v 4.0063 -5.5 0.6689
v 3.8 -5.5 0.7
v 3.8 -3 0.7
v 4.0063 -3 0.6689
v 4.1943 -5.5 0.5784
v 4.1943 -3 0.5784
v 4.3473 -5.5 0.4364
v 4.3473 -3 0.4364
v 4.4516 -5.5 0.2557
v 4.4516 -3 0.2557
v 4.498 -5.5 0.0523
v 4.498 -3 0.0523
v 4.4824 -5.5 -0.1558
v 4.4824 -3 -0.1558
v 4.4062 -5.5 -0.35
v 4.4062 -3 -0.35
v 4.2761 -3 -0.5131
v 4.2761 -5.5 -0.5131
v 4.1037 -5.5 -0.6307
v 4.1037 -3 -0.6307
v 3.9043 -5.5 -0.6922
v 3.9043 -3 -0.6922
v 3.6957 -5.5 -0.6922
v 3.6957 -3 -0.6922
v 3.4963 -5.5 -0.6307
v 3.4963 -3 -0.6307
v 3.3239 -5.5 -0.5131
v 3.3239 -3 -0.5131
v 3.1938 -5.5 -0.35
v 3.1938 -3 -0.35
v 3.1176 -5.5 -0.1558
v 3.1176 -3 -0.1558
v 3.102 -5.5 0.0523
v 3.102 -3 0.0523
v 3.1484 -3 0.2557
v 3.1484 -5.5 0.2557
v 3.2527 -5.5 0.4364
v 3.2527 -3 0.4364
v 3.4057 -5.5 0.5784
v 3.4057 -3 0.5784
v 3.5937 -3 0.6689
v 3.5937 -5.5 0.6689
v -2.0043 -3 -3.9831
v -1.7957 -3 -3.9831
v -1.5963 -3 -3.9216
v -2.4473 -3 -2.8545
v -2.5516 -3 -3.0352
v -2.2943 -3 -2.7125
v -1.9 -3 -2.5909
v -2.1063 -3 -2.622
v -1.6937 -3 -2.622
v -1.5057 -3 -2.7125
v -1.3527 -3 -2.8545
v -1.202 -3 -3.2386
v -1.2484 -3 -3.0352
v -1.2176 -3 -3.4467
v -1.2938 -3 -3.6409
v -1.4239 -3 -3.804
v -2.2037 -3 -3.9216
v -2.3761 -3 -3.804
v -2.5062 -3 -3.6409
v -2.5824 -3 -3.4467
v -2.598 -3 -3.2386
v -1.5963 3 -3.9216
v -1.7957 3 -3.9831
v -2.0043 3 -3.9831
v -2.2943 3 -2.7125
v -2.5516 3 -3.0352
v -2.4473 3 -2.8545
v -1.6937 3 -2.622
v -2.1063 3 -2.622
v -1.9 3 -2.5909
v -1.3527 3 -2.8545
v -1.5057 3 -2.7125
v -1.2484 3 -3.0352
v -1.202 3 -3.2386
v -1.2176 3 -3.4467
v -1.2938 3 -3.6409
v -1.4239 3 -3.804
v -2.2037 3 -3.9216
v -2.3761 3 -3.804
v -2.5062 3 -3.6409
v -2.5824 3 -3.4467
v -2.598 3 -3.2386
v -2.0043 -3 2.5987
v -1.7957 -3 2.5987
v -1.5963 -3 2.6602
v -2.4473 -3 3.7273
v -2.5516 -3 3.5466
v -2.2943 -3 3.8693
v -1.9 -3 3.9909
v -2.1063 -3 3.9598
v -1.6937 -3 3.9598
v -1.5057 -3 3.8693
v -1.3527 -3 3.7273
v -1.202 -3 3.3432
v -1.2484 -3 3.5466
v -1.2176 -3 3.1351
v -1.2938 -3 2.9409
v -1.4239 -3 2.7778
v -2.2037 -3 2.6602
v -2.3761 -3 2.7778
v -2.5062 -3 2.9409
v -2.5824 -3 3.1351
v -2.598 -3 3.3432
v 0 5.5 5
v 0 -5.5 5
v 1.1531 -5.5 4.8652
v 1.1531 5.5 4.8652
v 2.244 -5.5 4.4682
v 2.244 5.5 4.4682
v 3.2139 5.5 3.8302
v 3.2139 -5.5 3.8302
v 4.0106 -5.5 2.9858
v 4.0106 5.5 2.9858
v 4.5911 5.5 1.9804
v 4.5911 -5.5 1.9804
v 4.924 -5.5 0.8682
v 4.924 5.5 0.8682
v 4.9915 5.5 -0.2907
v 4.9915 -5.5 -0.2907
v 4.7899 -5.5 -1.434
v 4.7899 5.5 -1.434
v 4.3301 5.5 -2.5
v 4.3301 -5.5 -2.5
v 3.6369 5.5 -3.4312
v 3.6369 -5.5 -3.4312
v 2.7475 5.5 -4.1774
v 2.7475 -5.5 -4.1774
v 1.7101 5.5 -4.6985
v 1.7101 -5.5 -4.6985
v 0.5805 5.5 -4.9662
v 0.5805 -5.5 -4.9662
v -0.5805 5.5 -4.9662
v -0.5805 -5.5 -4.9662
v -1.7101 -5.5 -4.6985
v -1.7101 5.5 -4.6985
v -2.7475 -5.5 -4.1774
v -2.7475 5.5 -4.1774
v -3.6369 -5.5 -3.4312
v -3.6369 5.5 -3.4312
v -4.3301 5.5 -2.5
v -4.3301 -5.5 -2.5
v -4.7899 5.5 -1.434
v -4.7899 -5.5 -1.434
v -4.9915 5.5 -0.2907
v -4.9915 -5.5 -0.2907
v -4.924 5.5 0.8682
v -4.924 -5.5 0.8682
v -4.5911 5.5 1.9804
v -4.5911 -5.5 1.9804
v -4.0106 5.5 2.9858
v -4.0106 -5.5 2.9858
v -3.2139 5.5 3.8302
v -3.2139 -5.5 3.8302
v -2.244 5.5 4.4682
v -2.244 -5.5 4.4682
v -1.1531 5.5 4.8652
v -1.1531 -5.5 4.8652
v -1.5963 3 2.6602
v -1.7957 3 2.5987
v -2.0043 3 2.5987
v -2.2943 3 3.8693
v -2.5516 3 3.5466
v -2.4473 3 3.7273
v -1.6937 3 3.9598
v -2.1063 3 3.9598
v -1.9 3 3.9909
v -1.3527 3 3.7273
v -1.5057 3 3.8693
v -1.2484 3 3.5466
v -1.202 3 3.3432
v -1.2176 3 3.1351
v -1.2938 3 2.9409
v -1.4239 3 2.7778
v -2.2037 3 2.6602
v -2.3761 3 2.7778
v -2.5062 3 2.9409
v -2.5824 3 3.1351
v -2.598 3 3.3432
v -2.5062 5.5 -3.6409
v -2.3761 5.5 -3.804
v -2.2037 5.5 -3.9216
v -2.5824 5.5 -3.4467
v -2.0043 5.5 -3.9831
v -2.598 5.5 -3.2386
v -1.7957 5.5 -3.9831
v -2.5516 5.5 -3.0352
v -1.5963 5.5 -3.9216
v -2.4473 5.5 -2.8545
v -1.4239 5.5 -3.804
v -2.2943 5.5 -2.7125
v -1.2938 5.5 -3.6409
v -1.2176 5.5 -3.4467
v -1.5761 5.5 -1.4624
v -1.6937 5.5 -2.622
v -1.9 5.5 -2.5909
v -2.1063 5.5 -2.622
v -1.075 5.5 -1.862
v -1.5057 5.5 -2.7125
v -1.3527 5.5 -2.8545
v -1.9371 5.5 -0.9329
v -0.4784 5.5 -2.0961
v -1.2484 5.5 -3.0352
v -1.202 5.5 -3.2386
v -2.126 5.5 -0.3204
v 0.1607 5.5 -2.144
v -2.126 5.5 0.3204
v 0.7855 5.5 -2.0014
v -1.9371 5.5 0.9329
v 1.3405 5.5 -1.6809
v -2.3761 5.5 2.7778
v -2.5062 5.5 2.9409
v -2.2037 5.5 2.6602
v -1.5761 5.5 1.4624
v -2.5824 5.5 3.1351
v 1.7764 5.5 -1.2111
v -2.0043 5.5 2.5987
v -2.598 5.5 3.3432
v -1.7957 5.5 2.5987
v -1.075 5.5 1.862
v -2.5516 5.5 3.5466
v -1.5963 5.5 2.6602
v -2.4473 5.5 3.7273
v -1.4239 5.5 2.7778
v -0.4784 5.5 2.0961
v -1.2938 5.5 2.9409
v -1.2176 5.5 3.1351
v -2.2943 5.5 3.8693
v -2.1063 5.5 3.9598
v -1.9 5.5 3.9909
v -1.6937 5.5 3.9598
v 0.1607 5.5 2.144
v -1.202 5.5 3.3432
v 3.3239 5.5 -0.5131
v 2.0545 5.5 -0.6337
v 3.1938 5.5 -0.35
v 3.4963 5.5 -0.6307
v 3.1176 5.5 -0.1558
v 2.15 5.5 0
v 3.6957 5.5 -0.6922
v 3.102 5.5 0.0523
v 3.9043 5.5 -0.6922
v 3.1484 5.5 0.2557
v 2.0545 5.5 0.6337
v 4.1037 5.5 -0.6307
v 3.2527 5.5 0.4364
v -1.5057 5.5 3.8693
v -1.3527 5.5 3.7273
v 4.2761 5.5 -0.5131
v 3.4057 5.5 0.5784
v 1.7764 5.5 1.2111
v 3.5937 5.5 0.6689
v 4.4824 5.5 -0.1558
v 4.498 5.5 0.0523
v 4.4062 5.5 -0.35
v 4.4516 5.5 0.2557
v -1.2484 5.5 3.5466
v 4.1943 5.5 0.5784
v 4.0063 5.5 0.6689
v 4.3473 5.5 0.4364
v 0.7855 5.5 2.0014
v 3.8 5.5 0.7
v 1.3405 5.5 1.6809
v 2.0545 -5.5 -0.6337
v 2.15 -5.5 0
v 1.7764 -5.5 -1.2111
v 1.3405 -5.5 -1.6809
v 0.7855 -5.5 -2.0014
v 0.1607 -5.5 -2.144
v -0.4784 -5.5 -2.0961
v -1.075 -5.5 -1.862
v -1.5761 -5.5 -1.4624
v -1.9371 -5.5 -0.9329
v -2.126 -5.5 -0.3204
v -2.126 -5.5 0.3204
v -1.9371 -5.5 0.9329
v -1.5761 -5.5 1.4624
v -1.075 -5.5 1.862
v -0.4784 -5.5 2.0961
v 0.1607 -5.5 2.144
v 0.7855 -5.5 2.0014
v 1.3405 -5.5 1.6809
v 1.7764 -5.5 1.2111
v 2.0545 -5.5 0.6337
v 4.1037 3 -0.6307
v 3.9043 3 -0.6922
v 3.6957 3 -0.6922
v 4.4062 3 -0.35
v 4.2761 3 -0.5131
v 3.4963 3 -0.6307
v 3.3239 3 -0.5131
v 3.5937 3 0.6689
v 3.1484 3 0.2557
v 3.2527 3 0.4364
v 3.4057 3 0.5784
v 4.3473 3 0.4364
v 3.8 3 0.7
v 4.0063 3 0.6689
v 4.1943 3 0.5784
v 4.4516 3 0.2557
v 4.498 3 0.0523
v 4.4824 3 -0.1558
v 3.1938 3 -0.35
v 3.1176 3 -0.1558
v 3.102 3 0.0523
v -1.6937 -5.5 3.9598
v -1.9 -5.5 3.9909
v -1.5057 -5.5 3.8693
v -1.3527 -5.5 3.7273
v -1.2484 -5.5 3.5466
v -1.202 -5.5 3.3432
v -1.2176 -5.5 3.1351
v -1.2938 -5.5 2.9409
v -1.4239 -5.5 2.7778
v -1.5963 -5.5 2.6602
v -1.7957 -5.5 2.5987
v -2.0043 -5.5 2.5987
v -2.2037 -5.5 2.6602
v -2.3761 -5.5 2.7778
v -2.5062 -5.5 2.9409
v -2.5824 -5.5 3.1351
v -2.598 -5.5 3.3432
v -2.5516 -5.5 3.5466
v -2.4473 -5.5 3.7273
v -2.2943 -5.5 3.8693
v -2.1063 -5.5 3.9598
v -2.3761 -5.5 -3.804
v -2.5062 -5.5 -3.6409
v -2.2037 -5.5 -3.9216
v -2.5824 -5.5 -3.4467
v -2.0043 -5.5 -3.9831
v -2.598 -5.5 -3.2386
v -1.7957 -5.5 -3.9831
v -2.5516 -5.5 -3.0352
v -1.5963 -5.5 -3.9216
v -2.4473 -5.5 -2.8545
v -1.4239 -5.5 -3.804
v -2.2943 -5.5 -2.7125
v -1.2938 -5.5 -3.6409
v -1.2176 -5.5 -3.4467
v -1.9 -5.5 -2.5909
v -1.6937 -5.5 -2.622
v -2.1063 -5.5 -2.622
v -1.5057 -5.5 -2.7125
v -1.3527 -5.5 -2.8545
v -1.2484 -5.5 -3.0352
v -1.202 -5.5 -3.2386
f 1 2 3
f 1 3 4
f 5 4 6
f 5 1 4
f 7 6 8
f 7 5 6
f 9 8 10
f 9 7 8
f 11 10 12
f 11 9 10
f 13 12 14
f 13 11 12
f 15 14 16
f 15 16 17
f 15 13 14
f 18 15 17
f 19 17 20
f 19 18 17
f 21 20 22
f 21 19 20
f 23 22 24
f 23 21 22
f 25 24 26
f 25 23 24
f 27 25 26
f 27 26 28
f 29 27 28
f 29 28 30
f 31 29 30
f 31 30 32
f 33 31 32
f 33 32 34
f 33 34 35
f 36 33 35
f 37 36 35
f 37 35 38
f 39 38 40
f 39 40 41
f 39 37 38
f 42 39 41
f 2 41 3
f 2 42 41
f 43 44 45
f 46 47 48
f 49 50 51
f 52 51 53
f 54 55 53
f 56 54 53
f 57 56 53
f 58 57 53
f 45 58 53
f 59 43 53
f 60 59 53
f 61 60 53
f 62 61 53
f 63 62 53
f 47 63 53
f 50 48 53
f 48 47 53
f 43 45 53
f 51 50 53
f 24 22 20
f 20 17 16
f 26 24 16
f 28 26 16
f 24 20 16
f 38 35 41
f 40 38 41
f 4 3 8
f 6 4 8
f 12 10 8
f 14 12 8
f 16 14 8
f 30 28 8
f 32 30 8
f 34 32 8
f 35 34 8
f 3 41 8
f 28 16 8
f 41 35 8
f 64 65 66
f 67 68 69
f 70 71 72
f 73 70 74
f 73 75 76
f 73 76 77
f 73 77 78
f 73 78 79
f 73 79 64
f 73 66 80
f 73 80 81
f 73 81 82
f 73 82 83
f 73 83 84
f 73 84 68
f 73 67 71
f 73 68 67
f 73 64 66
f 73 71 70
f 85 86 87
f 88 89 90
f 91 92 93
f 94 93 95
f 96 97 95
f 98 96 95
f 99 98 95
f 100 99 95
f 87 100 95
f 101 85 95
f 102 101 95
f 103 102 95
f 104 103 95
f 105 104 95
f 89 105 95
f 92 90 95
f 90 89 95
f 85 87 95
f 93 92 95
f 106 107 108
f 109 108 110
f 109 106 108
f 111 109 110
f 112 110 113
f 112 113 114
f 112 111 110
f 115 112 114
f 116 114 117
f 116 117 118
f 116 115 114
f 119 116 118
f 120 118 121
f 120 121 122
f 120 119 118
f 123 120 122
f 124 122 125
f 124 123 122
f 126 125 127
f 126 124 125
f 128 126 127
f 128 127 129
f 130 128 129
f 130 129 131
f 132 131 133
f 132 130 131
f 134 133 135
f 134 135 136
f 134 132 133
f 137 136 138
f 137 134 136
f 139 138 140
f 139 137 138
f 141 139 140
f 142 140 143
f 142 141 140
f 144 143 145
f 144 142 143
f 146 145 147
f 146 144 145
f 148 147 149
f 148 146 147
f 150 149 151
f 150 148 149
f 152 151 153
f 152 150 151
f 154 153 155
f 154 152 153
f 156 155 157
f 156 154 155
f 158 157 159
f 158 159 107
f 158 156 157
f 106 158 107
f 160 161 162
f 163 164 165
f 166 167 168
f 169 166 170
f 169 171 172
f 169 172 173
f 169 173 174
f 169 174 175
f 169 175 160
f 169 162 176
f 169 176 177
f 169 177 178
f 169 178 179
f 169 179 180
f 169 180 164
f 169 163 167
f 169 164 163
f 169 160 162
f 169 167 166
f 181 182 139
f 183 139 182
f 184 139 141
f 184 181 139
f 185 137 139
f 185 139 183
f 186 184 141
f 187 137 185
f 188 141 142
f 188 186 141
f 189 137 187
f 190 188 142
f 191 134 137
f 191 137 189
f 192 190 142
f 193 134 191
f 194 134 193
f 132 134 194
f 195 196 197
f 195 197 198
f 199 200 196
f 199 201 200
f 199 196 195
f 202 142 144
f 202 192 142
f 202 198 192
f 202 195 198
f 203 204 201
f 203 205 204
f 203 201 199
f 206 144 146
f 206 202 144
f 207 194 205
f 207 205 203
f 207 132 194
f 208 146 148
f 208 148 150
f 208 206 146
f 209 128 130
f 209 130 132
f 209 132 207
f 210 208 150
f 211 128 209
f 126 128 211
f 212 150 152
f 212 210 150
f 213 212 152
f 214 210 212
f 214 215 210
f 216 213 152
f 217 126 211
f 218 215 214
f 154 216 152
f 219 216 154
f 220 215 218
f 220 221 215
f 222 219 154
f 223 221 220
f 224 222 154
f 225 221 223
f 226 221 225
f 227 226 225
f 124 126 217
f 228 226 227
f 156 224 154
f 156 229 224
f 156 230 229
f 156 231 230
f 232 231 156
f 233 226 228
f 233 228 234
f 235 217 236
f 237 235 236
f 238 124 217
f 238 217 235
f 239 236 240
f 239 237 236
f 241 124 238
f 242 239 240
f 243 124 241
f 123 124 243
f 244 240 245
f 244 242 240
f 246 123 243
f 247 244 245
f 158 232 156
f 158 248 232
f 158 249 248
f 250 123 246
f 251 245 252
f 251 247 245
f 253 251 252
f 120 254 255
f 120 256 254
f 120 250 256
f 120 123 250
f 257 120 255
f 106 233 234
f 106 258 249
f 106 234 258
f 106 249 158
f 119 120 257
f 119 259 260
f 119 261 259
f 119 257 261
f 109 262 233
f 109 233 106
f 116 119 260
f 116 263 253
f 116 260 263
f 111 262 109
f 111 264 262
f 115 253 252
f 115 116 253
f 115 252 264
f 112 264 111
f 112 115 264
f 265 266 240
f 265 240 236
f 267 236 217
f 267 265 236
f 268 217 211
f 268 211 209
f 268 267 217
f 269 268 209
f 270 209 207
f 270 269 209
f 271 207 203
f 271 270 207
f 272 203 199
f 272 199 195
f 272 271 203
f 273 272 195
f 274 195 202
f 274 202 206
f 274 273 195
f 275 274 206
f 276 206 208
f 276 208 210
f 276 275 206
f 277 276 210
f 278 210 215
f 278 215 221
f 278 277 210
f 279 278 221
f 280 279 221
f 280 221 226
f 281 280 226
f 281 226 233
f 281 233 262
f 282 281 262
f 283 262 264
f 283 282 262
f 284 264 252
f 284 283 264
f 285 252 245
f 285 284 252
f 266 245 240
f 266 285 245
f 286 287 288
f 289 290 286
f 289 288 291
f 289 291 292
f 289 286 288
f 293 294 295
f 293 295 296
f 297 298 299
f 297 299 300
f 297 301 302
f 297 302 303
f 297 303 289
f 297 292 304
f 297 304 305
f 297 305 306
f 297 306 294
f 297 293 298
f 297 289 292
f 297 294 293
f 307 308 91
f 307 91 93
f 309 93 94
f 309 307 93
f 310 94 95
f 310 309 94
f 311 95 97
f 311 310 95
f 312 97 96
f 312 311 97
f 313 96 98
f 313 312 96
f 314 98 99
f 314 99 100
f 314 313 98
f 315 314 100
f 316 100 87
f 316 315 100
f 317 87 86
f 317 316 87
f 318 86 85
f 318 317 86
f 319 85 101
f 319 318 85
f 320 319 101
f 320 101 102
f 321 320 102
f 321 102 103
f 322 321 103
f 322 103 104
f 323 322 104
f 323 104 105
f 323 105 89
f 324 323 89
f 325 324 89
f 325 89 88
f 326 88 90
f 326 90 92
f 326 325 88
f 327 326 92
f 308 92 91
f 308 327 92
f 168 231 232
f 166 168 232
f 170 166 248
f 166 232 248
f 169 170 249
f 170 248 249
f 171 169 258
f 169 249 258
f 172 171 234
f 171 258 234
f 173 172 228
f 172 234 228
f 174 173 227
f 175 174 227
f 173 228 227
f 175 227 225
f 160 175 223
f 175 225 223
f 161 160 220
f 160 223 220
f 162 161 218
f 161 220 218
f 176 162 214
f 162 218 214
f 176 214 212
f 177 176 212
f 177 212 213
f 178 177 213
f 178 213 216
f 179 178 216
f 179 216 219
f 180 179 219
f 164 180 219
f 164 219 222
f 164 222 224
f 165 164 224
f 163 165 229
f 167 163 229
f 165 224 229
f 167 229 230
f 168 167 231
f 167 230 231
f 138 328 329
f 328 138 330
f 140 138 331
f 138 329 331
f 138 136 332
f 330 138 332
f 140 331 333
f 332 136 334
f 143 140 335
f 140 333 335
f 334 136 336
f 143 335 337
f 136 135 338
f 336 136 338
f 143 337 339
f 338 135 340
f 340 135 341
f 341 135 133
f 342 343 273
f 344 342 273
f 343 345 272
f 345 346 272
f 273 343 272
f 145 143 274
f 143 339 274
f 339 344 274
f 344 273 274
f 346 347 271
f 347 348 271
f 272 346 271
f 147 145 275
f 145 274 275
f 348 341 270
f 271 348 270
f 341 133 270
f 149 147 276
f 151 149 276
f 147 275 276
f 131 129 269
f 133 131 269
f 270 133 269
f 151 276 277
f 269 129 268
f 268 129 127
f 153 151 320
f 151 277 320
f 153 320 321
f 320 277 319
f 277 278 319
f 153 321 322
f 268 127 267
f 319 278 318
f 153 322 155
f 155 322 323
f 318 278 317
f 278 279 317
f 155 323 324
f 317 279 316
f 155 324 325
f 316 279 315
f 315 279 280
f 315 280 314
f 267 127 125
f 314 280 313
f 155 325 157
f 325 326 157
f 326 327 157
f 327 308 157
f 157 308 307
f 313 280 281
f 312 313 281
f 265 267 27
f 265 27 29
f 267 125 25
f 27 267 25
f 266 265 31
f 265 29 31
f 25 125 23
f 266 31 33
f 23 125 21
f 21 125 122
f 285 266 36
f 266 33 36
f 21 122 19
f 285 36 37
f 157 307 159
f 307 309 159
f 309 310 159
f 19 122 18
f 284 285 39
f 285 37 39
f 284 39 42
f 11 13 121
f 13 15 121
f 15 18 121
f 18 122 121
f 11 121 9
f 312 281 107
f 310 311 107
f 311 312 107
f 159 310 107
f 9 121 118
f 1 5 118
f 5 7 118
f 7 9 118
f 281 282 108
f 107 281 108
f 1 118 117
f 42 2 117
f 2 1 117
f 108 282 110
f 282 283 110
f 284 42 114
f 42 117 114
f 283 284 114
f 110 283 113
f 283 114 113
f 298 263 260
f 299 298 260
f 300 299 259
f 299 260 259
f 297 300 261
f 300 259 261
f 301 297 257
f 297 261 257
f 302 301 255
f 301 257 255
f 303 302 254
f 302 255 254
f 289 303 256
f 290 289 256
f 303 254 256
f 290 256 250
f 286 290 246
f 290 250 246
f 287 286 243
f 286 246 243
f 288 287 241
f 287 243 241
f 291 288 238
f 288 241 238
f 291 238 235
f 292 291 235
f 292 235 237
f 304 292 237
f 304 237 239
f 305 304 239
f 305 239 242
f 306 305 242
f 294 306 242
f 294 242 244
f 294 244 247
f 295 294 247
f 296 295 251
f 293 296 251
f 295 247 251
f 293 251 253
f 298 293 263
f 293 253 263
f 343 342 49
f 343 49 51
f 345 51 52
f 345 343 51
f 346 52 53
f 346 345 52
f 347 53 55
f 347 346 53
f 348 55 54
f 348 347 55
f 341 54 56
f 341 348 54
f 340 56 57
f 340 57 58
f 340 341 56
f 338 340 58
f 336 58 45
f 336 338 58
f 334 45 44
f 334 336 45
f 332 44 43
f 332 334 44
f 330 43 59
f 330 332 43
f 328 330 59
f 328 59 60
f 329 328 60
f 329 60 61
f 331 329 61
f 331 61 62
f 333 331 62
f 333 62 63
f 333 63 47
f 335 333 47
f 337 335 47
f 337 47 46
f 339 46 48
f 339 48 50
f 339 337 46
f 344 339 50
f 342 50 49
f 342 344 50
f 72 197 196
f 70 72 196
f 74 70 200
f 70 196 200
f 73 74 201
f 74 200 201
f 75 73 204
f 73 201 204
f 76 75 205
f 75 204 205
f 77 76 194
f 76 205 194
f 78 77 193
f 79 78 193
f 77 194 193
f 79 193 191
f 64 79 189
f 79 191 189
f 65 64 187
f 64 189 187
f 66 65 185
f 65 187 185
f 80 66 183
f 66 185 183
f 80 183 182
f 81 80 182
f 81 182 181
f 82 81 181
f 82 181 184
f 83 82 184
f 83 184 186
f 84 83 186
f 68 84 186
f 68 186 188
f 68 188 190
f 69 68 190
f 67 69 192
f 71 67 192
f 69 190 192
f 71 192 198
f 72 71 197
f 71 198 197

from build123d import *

# Parameters (mm, degrees)
SKETCH1_R           = 5
BOSS_EXTRUDE1_DEPTH = 5.5
SKETCH2_R           = 0.7
CUT_EXTRUDE1_DEPTH  = 2.5
HOLE1_START         = -5.5
HOLE1_OUTLINE_R     = 2.15
HOLE1_DEPTH         = 11


# Read off the part's stored shape, not the designer's step: Hole1
with BuildPart() as part:
    # Sketch1 → Boss-Extrude1 (new, symmetric)
    with BuildSketch(Plane(origin=(0, 0, 0), x_dir=(1, 0, 0), z_dir=(0, 1, 0))):
        with Locations(Location((0, 0, 0), (0, 0, 270))):
            Circle(SKETCH1_R)
    extrude(amount=BOSS_EXTRUDE1_DEPTH, both=True)

    # Sketch2 → Cut-Extrude1 (cut)
    with BuildSketch(Plane(origin=(0, 5.5, 0), x_dir=(1, 0, 0), z_dir=(0, 1, 0))):
        with Locations(Location((3.8, 0, 0), (0, 0, 270))):
            Circle(SKETCH2_R)
        with Locations(Location((-1.9, -3.290896534, 0), (0, 0, 270))):
            Circle(SKETCH2_R)
        with Locations(Location((-1.9, 3.290896534, 0), (0, 0, 270))):
            Circle(SKETCH2_R)
    cut_extrude1 = extrude(amount=-CUT_EXTRUDE1_DEPTH, mode=Mode.SUBTRACT)

    # Mirror1: Cut-Extrude1 across plane
    add(cut_extrude1.mirror(Plane.ZX), mode=Mode.SUBTRACT)

    # Hole1 outline → Hole1 (cut)
    with BuildSketch(Plane(origin=(0, 0, 0), x_dir=(1, 0, 0), z_dir=(0, 1, 0)).offset(HOLE1_START)):
        Circle(HOLE1_OUTLINE_R)
    extrude(amount=HOLE1_DEPTH, mode=Mode.SUBTRACT)


solid = part.part
